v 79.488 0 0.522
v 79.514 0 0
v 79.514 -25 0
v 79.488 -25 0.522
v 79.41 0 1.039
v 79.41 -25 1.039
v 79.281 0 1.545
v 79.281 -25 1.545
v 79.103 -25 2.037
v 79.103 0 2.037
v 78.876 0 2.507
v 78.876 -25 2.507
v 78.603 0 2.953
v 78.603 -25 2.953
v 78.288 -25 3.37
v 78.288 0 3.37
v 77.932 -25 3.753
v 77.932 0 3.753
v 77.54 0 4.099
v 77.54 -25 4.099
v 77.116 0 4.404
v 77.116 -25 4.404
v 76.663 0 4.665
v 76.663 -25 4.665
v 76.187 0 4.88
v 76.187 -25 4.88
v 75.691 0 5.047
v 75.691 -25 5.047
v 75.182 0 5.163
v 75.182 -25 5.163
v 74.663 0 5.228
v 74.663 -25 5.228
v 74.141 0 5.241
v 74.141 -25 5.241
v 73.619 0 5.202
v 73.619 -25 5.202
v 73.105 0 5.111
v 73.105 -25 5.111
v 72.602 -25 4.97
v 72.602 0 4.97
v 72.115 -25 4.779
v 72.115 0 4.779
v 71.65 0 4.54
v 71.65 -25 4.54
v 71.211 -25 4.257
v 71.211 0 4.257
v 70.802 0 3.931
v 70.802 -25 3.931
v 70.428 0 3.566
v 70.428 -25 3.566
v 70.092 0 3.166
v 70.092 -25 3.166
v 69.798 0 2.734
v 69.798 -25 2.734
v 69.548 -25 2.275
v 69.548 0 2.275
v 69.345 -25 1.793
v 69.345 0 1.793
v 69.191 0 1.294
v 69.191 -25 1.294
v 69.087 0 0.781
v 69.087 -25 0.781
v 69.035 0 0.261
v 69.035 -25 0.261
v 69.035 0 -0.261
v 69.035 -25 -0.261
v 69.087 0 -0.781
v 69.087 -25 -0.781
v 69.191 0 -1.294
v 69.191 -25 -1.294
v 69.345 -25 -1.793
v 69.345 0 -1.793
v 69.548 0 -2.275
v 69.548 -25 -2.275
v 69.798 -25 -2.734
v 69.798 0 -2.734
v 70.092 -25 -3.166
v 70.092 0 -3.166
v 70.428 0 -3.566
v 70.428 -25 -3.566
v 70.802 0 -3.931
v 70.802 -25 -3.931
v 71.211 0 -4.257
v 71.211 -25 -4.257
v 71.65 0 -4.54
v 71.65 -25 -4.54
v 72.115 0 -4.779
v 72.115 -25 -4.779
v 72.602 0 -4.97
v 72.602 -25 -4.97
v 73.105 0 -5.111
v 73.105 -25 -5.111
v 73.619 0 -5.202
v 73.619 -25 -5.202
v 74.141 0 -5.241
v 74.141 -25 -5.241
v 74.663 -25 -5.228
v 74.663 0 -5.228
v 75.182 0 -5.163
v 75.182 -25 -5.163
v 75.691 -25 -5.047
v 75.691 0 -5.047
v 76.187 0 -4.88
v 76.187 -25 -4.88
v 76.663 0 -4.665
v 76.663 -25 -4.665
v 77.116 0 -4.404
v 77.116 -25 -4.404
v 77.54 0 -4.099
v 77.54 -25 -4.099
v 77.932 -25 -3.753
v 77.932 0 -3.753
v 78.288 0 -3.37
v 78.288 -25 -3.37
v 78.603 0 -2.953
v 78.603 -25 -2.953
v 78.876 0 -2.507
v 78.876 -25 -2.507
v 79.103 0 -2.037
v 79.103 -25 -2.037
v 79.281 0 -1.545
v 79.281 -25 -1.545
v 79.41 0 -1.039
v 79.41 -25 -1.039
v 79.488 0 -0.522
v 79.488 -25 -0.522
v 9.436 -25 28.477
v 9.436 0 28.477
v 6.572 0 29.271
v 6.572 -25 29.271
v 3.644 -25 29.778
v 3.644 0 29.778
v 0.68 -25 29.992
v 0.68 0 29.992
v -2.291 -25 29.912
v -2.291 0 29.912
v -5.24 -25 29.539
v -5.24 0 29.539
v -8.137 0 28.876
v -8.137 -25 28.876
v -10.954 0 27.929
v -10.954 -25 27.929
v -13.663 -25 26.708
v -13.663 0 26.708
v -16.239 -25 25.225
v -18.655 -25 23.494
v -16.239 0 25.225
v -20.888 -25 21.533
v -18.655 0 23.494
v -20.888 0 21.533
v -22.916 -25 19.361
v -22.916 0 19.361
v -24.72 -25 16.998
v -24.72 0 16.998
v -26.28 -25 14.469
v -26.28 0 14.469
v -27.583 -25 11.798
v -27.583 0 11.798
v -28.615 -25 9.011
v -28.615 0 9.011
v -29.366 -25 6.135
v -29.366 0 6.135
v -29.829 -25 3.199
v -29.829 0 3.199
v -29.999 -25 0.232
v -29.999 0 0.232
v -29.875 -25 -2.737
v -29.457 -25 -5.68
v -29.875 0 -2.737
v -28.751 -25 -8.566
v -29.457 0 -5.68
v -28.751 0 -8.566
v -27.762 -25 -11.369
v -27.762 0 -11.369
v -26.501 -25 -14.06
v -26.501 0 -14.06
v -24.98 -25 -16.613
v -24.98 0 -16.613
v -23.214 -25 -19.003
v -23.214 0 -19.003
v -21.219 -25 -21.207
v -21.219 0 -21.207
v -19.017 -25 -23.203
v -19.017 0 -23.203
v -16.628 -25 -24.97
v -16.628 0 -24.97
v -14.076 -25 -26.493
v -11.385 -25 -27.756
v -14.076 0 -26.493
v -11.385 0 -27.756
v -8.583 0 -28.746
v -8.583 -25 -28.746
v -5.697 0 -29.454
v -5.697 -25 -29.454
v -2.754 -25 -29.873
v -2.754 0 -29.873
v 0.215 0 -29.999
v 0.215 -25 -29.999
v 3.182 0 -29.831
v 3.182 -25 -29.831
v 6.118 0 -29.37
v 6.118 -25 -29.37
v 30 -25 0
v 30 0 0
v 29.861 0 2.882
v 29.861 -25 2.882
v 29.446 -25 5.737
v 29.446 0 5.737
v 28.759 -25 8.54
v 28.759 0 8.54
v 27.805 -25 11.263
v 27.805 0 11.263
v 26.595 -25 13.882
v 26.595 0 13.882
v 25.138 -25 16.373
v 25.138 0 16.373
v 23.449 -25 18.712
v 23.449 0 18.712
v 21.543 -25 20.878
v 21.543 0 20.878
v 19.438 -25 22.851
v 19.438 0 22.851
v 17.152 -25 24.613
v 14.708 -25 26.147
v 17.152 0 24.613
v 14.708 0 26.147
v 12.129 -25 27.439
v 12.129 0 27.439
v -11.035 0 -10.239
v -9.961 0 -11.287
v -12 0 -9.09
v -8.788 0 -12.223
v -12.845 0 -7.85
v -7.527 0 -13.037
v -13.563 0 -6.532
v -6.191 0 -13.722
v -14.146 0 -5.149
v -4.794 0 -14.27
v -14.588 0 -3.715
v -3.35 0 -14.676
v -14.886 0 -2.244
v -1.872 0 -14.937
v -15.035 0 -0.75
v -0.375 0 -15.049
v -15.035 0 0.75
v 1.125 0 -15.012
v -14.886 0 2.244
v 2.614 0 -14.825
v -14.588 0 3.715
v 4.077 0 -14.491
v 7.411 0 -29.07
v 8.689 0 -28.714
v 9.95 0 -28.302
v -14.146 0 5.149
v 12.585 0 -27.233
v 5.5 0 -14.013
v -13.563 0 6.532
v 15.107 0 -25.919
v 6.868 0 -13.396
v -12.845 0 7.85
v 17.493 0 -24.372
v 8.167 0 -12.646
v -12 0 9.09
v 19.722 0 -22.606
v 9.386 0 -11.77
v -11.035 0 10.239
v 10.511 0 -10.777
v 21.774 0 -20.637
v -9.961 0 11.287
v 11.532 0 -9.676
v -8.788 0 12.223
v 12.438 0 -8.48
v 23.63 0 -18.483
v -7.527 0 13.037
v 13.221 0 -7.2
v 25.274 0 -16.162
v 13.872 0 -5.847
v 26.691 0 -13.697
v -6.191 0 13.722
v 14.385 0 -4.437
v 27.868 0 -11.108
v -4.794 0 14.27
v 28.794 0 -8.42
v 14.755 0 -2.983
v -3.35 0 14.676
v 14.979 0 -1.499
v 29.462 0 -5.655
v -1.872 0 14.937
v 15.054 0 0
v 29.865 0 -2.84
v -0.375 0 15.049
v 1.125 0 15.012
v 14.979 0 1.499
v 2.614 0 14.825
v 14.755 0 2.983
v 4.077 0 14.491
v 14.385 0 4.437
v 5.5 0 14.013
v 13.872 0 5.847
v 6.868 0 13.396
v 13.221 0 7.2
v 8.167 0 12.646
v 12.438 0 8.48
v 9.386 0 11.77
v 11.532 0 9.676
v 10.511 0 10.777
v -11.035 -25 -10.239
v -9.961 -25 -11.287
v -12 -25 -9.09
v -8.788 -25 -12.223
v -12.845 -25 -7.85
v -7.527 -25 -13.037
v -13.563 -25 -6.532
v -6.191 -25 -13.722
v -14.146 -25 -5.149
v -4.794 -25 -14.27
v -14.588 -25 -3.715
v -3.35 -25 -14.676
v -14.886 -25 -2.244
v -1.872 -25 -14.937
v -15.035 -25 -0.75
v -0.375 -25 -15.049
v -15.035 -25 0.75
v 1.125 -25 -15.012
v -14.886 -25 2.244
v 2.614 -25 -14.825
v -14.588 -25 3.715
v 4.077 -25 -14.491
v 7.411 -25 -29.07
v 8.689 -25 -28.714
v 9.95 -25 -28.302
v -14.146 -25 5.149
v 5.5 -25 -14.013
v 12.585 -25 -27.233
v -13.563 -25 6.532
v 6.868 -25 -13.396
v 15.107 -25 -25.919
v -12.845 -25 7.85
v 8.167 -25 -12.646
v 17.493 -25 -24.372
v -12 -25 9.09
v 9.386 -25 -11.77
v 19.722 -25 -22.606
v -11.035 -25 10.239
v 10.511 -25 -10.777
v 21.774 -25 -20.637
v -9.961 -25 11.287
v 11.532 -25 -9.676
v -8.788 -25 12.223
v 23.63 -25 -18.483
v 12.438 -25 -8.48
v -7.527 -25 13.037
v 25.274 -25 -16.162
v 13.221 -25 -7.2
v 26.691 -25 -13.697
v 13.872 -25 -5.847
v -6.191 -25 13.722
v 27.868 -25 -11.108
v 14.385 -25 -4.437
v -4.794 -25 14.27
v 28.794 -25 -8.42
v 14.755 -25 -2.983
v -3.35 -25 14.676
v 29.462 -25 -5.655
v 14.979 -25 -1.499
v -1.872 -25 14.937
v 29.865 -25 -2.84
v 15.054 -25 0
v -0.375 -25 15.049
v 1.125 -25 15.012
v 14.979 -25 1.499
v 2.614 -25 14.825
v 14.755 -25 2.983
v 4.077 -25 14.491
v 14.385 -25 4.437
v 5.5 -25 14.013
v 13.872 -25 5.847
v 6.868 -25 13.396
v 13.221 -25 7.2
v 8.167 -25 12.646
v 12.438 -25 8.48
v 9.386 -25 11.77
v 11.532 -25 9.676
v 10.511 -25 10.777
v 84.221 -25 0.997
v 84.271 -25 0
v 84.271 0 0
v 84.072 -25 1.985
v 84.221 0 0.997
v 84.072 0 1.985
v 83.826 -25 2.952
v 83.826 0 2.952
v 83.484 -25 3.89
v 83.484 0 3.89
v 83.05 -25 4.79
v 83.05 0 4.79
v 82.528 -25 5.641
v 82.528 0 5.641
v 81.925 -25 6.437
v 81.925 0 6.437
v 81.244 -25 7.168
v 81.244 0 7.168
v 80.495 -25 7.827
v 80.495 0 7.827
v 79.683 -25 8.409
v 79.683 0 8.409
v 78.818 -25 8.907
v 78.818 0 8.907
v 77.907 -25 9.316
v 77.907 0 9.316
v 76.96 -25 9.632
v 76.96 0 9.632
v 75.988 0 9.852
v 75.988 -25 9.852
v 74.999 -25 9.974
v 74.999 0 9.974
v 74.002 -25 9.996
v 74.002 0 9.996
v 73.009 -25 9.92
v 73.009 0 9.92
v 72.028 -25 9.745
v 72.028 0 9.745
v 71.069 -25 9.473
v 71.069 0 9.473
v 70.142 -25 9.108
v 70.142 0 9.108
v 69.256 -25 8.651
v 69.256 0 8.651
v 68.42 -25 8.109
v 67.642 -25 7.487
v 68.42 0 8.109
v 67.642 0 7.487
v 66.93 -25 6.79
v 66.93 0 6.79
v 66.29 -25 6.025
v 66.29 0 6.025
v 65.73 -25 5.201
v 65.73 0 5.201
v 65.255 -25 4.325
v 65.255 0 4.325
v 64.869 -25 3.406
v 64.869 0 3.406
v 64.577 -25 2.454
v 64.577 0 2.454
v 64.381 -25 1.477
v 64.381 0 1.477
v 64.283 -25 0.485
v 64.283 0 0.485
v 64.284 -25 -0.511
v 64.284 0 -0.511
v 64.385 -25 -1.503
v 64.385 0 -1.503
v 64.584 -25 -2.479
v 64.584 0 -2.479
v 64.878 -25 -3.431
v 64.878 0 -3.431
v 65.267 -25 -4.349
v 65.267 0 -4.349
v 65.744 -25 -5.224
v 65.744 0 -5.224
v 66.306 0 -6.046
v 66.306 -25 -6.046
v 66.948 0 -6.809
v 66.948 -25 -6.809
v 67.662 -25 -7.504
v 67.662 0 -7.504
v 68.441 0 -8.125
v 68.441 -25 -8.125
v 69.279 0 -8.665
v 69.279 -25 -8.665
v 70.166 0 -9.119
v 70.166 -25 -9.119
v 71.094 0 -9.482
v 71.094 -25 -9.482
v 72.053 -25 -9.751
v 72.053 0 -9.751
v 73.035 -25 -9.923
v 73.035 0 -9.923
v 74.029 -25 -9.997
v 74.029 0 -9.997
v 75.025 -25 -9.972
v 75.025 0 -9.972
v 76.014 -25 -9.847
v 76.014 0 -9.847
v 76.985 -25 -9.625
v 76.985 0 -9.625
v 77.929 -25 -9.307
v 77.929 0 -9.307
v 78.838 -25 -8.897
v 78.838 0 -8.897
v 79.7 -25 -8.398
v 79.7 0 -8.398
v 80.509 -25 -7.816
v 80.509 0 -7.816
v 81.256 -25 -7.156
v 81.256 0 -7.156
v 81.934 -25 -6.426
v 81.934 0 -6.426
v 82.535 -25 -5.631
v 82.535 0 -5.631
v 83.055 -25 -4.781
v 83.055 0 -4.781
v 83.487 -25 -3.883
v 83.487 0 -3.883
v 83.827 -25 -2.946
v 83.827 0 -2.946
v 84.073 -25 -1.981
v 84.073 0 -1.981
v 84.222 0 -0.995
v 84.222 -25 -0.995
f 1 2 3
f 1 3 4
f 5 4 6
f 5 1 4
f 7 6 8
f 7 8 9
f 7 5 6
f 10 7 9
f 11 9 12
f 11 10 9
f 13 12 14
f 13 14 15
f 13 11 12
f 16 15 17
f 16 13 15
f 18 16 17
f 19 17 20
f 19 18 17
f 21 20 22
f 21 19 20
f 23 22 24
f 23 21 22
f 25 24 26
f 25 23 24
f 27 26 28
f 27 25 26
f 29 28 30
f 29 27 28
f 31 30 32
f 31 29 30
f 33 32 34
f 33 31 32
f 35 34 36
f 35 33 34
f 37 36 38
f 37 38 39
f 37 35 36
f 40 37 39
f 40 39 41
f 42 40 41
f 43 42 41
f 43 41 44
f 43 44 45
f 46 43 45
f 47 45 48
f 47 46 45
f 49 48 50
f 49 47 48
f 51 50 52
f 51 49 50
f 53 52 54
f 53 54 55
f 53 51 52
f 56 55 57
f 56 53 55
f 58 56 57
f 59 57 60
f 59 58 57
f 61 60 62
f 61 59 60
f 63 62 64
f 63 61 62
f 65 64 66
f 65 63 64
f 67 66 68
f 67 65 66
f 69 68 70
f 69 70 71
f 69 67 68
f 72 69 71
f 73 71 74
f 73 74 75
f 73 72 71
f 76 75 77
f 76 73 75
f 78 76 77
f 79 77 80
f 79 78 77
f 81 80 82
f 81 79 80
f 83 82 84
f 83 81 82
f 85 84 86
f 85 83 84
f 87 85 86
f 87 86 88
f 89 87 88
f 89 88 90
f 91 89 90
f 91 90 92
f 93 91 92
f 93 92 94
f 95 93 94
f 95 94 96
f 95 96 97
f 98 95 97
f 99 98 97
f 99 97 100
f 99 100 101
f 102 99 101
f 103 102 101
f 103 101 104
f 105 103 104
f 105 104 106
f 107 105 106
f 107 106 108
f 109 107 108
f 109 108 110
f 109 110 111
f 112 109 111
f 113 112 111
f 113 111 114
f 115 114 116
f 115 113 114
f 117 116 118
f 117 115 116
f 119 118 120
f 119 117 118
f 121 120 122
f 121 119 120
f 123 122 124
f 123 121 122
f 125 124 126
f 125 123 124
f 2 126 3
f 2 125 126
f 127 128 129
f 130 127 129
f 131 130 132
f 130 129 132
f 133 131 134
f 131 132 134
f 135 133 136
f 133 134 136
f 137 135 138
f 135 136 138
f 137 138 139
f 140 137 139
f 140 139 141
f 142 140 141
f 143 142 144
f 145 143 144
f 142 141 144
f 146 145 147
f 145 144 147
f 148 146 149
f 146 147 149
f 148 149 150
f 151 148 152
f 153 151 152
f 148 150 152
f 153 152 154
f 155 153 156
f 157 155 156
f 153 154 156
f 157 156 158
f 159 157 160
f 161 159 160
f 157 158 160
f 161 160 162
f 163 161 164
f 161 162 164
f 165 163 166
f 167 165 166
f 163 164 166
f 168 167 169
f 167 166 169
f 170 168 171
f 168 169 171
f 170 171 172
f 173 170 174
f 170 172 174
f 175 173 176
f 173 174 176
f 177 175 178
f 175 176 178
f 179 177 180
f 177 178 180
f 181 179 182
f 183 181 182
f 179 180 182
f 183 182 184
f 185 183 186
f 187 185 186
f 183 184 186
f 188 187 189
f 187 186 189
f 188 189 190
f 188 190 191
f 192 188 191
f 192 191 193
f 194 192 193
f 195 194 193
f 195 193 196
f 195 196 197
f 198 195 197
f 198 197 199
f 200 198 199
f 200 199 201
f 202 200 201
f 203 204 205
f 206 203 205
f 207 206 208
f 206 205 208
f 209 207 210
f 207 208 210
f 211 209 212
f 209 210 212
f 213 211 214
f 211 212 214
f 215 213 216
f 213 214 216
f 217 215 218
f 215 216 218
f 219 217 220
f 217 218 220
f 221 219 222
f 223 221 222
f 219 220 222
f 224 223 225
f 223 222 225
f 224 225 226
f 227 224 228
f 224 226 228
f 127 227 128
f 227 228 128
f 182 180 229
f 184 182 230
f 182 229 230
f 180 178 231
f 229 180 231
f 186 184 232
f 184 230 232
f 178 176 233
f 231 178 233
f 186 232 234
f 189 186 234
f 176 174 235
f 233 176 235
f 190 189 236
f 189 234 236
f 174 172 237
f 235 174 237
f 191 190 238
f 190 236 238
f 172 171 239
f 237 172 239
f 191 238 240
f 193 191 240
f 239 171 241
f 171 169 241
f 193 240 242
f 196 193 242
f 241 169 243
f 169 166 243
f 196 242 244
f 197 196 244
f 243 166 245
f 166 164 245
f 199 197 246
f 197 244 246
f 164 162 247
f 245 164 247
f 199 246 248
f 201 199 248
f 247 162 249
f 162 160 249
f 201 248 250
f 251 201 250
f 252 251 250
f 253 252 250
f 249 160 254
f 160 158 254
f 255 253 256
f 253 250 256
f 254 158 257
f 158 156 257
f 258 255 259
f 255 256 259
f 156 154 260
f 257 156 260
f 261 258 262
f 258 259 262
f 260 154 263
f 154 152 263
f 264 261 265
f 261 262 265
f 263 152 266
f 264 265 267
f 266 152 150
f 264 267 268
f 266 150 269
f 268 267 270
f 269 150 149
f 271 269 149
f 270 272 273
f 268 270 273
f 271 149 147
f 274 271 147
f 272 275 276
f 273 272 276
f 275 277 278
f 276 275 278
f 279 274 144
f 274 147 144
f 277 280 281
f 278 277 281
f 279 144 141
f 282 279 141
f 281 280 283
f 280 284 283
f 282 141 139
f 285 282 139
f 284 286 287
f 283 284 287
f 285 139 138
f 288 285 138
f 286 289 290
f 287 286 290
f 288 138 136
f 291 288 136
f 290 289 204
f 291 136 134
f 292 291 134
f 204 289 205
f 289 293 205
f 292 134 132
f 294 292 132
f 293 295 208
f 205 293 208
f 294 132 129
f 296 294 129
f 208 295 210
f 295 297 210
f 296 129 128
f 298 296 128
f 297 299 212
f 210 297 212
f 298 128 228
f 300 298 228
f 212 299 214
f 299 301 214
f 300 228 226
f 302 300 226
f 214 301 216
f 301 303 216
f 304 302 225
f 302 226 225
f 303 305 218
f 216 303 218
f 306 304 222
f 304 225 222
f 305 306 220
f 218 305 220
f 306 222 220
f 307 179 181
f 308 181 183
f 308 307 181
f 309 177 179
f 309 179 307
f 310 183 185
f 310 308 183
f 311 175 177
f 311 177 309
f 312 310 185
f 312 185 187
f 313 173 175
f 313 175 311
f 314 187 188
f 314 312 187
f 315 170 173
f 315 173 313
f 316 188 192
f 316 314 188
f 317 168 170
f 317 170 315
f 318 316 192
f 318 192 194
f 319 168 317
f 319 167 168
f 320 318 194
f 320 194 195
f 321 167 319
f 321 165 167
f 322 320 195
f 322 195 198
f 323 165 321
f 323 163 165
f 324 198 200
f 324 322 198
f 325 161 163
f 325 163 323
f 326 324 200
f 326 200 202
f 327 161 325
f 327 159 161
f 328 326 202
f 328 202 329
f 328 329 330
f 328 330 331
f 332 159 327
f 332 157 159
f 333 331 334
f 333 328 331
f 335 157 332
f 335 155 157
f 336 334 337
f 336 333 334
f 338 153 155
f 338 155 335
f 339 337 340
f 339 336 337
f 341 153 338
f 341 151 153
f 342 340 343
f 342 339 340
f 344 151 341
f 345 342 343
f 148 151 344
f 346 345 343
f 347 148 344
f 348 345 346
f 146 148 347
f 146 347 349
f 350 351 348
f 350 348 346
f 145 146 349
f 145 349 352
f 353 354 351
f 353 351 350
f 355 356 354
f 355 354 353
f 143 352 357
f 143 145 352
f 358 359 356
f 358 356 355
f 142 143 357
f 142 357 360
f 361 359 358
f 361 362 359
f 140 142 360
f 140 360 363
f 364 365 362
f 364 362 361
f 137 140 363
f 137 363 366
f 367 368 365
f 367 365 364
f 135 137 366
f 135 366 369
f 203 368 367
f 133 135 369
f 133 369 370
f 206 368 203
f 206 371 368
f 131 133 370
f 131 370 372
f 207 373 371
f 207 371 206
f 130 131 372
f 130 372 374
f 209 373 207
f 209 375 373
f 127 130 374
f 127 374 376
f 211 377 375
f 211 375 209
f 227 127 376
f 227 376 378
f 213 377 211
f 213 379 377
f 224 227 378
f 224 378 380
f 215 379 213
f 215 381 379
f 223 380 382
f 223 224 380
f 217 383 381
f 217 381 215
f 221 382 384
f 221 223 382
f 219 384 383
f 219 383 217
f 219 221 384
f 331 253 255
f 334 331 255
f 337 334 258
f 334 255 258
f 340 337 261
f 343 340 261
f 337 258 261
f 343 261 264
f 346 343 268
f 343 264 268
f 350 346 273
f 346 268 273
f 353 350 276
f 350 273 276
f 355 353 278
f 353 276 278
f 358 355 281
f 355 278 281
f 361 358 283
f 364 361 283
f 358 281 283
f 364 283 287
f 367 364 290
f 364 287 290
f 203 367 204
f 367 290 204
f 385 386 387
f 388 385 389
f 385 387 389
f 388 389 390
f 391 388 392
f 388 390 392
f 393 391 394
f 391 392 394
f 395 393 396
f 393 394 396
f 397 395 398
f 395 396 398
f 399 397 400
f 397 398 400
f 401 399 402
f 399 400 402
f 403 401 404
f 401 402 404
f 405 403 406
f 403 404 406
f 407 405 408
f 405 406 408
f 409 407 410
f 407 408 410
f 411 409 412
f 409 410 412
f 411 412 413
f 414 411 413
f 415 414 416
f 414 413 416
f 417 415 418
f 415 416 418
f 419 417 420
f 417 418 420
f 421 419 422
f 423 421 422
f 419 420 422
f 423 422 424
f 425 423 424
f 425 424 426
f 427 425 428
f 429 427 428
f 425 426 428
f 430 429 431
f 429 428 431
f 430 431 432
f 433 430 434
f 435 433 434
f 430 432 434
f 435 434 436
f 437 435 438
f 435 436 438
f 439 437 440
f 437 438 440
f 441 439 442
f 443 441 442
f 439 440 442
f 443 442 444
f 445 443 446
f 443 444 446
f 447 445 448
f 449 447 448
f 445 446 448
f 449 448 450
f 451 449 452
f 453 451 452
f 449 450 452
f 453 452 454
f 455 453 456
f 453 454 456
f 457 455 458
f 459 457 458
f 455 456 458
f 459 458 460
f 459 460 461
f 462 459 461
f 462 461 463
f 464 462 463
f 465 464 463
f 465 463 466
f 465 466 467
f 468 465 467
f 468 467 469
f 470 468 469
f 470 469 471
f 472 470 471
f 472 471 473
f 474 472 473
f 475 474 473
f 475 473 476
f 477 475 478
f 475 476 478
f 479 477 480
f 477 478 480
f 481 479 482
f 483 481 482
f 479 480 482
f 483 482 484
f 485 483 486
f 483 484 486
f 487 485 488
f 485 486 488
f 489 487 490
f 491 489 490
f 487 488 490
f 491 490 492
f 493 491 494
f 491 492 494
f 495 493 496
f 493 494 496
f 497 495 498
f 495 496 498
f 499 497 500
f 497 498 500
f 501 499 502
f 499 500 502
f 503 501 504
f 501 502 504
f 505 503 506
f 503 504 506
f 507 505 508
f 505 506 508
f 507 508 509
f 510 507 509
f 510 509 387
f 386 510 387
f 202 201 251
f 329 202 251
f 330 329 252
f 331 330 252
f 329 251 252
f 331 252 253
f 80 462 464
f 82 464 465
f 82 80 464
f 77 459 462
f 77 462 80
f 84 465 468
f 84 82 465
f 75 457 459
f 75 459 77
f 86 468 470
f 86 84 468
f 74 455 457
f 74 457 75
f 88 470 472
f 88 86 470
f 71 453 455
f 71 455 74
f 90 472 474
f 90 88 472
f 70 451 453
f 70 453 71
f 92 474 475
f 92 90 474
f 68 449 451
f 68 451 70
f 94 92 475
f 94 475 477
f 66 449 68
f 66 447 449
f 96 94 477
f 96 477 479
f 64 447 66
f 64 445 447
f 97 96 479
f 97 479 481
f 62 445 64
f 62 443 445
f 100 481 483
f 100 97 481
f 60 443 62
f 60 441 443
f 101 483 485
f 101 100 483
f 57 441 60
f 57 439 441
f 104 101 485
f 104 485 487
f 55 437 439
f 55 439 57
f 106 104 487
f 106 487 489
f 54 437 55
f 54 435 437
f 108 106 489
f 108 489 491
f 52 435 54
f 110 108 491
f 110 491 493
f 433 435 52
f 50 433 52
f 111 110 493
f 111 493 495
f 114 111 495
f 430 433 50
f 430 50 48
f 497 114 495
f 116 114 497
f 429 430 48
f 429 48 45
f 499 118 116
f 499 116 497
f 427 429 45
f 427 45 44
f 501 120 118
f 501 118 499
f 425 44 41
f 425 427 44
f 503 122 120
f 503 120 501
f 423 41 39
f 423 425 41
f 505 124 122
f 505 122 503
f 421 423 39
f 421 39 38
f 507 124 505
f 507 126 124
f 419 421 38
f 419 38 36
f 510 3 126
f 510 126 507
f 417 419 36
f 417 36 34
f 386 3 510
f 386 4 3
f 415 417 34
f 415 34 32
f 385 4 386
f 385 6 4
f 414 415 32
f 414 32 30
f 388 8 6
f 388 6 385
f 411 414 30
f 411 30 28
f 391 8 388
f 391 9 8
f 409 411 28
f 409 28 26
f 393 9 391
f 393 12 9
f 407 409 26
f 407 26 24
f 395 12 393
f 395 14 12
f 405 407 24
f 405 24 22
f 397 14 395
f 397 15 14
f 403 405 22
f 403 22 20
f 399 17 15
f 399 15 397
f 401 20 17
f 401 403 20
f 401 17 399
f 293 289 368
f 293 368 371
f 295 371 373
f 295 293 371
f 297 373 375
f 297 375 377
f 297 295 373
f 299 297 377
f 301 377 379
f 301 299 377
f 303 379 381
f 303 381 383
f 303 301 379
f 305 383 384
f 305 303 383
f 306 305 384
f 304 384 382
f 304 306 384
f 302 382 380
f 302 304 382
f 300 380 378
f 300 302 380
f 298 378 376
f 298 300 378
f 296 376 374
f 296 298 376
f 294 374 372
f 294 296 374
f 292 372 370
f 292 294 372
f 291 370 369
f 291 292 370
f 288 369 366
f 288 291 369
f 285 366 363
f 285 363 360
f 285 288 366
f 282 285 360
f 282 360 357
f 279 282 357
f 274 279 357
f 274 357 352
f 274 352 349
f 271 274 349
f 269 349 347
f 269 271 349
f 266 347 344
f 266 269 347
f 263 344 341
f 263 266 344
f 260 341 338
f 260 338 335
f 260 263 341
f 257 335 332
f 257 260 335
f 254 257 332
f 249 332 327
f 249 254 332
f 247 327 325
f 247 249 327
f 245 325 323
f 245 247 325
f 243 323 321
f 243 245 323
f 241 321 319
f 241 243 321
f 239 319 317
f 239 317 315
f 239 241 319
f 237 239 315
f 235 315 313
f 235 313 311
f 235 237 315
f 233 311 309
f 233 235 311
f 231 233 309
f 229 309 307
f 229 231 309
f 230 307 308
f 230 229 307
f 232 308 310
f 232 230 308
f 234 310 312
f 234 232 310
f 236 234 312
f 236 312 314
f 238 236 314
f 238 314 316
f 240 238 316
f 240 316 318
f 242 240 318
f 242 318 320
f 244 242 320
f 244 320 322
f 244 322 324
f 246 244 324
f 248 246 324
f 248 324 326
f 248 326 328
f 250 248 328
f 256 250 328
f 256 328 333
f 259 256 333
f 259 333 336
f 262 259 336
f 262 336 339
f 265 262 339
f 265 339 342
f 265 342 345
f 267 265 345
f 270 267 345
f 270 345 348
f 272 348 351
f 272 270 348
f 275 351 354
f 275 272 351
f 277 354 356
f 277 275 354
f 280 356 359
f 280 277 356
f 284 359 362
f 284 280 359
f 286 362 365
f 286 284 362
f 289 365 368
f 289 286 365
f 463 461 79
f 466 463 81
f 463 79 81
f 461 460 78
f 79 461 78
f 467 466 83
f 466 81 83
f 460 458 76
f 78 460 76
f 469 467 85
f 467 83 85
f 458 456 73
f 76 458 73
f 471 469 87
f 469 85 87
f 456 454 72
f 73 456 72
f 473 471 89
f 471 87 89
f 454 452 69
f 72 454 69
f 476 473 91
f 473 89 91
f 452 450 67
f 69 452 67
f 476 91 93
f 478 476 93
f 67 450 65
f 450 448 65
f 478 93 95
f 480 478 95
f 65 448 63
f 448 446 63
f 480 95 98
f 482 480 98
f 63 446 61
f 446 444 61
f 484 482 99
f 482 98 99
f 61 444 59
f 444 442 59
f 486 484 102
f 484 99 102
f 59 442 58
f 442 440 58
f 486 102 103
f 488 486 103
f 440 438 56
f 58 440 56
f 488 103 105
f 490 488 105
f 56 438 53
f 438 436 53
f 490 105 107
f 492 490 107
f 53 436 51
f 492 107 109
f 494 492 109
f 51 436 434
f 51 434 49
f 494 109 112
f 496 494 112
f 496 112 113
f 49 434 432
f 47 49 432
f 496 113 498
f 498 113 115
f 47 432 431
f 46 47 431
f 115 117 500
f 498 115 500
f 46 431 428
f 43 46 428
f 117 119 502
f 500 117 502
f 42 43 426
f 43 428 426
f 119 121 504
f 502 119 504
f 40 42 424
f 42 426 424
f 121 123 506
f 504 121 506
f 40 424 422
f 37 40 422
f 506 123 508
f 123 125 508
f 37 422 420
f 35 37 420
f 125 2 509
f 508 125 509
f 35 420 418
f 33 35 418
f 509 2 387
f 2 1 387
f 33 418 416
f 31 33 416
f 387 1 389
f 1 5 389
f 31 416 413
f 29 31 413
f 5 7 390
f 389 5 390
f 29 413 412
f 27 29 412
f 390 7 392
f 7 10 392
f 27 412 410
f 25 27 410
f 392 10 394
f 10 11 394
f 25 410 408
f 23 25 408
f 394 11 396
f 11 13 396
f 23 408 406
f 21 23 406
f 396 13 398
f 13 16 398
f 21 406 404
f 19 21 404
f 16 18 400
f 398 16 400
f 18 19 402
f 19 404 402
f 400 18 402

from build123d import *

# Parameters (mm, degrees)
F0_R     = 15.053847
F0_R_2   = 5.242883
F1_DEPTH = 25


with BuildPart() as f1:
    # F0 (on Front) → F1 (new body)
    with BuildSketch(Plane.XZ):
        with BuildLine():
            ThreePointArc((9.950043, -28.301884), (24.479597, -17.342126), (30, 0))
            ThreePointArc((30, 0), (24.321725, 17.56285), (9.436419, 28.477254))
            ThreePointArc((9.436419, 28.477254), (-29.950765, 1.718053), (6.118181, -29.369506))
            Line((6.118181, -29.369506), (9.950043, -28.301884))
        make_face()
        Circle(F0_R, mode=Mode.SUBTRACT)
        with BuildLine():
            ThreePointArc((84.271339, 0), (82.236329, 6.046398), (76.959552, 9.631901))
            ThreePointArc((76.959552, 9.631901), (66.306349, -6.046398), (84.271339, 0))
        make_face()
        with Locations((74.271339, 0)):
            Circle(F0_R_2, mode=Mode.SUBTRACT)
        with BuildLine():
            ThreePointArc((6.118181, -29.369506), (8.051827, -28.899275), (9.950043, -28.301884))
            Line((9.950043, -28.301884), (6.118181, -29.369506))
        make_face()
    extrude(amount=F1_DEPTH)


solid = f1.part
